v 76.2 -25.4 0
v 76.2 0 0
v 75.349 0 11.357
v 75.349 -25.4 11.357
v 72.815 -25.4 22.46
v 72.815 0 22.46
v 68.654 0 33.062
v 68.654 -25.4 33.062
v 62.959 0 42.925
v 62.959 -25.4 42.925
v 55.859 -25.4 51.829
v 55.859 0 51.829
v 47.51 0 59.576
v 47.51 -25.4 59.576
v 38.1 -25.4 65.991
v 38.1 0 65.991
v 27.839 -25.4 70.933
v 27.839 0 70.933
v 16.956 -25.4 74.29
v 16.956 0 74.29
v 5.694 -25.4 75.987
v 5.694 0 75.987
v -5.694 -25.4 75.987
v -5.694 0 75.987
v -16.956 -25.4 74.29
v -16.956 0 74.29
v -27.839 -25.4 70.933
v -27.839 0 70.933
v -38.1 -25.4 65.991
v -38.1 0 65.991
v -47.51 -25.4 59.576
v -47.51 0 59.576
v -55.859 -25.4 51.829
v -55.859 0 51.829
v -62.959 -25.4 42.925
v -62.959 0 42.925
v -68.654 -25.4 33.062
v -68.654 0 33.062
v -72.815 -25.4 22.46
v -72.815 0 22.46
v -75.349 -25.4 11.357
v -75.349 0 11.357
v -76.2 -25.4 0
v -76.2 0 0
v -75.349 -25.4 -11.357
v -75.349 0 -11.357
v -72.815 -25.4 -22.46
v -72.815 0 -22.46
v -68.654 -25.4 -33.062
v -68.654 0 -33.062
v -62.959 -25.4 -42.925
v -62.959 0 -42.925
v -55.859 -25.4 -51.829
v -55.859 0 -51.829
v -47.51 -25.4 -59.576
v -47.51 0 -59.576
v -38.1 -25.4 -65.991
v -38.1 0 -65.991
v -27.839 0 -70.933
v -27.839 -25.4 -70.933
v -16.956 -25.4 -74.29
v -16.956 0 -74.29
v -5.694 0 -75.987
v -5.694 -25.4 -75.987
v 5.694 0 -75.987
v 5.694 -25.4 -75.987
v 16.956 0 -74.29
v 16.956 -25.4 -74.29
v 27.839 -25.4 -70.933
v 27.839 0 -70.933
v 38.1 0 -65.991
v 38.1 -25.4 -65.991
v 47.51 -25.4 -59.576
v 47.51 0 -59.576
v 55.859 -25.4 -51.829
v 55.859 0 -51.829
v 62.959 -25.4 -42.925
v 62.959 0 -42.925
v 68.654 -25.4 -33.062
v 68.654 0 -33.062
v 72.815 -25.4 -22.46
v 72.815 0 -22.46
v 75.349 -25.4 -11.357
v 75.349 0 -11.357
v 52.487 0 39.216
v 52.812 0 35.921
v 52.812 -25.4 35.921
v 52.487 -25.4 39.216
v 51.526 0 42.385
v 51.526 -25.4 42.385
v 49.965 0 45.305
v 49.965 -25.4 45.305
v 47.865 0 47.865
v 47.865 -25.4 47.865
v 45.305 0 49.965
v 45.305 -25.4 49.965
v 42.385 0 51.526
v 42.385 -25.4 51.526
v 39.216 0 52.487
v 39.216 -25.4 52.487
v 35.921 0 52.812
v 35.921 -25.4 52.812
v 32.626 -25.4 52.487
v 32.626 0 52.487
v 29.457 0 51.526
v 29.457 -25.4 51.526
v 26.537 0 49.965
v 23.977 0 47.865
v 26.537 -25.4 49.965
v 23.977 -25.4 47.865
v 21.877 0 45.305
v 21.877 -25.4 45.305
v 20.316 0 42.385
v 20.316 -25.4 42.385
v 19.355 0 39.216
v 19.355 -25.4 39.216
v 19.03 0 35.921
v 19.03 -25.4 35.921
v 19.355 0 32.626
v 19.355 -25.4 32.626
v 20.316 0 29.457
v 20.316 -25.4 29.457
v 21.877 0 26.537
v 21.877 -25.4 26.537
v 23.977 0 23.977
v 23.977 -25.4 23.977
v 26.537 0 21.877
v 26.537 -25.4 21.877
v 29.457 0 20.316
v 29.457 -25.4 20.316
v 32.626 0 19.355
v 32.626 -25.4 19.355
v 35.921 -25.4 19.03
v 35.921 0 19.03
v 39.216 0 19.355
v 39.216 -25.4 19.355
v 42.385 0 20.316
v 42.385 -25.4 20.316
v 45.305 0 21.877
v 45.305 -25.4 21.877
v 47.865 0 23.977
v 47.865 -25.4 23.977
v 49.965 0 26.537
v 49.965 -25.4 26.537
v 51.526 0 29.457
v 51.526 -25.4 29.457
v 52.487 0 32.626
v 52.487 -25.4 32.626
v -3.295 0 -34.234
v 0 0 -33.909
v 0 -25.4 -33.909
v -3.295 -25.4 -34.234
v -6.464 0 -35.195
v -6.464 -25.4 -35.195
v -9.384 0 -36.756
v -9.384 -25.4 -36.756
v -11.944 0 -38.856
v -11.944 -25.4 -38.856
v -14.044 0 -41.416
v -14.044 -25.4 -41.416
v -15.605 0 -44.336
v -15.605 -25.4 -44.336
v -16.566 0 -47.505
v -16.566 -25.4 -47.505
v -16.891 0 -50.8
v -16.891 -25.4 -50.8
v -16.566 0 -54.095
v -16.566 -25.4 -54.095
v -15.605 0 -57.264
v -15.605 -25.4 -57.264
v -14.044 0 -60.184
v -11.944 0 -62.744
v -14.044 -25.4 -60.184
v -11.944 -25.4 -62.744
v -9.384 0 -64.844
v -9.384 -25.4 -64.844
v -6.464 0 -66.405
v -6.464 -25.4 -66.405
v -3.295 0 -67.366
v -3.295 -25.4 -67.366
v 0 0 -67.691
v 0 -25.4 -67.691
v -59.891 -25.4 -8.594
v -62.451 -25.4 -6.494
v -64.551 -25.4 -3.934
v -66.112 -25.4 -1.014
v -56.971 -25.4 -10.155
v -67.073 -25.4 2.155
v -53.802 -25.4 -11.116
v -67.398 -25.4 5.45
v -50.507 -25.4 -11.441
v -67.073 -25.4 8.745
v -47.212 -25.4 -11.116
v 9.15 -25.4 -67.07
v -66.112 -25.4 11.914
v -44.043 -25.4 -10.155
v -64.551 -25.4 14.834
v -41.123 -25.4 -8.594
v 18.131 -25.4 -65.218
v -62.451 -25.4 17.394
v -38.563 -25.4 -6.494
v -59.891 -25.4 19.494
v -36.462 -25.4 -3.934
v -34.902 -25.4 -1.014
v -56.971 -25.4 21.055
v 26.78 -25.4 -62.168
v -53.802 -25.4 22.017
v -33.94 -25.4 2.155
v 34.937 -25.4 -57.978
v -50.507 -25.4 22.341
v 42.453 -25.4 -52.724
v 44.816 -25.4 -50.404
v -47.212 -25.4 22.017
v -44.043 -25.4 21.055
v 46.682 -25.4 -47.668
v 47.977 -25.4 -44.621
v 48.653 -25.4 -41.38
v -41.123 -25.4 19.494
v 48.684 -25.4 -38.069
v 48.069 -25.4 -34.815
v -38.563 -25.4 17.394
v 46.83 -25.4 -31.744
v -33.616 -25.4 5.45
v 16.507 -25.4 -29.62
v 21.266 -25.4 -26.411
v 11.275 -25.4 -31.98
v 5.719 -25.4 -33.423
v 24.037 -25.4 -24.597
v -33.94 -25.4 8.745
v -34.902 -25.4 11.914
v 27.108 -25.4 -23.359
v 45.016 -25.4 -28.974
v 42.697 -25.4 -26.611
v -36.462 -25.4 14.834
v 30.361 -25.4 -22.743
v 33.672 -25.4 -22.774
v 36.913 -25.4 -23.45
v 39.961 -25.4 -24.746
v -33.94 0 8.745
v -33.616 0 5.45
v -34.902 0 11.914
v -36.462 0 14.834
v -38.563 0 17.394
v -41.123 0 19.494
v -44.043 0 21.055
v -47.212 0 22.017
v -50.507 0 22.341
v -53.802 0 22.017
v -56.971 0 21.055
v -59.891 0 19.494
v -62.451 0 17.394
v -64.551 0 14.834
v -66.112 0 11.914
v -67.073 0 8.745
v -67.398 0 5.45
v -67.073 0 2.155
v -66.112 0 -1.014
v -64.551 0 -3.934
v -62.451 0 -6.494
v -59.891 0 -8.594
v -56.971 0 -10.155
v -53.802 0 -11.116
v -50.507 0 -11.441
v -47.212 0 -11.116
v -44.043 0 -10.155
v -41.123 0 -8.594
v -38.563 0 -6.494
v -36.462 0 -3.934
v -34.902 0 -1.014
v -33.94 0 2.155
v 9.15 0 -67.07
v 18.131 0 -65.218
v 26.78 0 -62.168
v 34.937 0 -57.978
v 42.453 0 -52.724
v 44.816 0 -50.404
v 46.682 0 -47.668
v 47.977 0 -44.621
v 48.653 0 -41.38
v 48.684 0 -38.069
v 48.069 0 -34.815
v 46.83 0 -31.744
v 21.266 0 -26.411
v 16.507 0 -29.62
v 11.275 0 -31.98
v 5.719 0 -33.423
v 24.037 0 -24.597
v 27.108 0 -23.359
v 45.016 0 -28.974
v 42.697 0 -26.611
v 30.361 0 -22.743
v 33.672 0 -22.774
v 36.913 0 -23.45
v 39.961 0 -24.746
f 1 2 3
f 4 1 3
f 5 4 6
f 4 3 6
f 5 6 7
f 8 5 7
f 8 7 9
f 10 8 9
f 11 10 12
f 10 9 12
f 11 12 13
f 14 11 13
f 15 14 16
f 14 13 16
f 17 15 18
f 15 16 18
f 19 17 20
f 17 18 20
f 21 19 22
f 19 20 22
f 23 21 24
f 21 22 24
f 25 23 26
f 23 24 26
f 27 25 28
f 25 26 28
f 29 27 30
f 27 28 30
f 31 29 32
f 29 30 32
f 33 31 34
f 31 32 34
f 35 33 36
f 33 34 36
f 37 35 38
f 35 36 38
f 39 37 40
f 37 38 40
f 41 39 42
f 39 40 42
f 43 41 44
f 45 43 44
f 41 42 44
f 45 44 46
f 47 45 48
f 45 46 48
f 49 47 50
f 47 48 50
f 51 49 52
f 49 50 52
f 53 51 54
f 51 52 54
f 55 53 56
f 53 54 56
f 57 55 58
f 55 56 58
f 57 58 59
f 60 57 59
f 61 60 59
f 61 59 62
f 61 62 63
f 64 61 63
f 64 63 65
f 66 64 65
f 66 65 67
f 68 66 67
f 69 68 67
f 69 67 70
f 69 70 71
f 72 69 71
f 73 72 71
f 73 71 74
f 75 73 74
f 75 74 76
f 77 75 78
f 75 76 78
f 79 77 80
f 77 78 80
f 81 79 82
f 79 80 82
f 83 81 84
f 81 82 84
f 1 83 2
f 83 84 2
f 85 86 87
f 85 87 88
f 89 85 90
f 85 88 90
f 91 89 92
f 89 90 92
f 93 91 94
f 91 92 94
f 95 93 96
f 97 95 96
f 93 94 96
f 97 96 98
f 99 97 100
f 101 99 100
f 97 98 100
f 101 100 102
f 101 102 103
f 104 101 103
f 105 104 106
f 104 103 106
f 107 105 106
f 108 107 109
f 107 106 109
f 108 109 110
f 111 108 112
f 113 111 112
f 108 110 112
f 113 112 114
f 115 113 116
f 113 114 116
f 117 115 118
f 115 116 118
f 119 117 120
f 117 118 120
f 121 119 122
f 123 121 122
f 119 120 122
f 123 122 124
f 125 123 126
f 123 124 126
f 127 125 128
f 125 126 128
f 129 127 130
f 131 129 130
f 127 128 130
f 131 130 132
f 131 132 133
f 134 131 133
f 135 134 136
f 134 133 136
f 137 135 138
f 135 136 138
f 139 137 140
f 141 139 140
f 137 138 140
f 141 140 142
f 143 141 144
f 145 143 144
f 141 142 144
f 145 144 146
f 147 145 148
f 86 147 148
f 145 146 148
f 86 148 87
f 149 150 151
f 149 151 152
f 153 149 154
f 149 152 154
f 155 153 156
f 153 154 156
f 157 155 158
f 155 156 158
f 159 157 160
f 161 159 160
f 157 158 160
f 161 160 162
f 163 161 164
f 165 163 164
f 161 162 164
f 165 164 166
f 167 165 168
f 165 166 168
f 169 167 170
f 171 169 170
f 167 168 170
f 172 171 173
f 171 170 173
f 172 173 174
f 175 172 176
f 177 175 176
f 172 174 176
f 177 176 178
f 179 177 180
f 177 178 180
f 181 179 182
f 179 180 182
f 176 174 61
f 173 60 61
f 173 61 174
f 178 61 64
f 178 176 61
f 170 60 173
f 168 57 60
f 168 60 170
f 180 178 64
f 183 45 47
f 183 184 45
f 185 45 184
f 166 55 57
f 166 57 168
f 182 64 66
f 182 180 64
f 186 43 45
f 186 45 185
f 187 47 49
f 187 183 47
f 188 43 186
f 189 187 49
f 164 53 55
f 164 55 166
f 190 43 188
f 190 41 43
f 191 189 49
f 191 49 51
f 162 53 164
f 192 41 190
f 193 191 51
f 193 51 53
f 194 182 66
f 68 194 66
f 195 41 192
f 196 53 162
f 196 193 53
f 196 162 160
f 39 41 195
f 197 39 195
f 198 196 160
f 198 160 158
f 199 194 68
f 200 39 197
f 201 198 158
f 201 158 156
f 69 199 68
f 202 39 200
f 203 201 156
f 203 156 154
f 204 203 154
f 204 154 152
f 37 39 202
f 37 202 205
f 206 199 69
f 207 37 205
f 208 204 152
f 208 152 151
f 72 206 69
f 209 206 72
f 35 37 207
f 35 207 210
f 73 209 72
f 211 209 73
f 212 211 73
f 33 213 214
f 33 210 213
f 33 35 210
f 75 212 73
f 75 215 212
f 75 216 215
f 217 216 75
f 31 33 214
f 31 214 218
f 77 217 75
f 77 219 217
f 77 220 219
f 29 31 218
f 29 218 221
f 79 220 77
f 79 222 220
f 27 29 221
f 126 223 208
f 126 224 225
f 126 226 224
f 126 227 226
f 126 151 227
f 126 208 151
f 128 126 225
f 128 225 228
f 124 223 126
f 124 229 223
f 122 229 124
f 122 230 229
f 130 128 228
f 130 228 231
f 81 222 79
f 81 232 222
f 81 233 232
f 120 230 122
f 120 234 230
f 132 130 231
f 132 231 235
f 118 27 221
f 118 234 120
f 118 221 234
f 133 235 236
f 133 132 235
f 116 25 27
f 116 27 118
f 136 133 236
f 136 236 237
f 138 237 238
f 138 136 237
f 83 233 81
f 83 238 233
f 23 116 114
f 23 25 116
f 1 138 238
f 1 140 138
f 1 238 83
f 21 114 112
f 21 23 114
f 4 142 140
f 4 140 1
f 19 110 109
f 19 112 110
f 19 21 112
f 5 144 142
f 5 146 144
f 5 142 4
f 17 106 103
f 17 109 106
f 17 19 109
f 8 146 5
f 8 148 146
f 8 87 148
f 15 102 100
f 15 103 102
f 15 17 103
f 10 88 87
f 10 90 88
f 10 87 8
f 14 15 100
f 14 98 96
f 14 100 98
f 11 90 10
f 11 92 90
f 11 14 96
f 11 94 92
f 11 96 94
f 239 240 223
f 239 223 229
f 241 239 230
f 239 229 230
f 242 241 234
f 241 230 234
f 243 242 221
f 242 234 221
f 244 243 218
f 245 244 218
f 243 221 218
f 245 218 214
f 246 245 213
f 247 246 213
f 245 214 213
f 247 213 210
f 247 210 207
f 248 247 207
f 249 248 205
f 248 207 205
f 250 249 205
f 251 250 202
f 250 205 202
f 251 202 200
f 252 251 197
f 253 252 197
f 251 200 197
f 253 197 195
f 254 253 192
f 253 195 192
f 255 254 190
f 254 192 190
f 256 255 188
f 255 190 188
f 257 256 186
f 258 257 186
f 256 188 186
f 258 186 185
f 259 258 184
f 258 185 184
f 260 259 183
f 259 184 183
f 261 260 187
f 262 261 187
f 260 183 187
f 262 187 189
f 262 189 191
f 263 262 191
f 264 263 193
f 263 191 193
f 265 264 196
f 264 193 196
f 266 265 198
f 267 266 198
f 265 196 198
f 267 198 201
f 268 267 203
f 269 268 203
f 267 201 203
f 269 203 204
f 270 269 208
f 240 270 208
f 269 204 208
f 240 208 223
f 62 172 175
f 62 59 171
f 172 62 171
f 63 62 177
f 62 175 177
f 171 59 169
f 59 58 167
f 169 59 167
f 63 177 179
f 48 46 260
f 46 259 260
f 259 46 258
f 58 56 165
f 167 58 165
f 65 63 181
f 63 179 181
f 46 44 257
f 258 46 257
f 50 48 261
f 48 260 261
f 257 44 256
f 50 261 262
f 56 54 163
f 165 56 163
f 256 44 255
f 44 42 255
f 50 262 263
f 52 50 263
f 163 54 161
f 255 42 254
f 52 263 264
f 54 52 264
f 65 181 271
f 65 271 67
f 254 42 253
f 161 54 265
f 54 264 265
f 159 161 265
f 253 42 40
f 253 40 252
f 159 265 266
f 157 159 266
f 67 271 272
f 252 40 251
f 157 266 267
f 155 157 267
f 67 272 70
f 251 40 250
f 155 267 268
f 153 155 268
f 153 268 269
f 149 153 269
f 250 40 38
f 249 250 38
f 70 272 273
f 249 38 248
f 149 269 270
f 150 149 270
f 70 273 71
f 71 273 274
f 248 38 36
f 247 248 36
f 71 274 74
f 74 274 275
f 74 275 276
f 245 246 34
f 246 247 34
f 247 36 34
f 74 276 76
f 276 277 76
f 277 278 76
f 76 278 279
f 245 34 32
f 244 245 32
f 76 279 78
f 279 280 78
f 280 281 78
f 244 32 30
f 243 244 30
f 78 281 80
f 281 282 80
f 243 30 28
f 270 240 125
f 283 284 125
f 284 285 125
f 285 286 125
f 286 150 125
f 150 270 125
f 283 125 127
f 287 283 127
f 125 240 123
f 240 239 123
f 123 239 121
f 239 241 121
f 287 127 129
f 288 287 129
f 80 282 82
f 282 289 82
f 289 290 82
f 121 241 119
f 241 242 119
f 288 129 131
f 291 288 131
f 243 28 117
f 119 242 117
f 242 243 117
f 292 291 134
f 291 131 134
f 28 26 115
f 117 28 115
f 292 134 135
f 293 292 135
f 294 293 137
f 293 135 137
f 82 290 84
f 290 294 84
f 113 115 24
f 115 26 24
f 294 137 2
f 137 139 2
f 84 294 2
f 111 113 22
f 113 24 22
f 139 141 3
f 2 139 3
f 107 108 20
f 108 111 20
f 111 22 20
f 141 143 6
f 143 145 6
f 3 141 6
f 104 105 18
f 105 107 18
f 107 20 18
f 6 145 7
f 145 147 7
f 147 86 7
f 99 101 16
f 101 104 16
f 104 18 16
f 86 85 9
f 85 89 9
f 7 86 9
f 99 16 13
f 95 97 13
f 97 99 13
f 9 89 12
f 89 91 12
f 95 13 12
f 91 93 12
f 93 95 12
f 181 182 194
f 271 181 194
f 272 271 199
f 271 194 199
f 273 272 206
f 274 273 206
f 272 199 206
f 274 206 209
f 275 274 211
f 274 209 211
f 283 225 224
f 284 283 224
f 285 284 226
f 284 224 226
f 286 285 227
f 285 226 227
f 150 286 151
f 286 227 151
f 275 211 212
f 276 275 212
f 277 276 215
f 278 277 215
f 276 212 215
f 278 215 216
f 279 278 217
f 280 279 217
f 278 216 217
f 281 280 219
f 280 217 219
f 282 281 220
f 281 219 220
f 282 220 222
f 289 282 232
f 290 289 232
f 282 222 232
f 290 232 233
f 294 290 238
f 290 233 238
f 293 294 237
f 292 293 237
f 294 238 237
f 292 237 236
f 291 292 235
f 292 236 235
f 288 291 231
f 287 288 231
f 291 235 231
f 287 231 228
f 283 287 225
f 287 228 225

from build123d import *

# Parameters (mm, degrees)
F0_R     = 76.2
F1_DEPTH = 25.4
F3_R     = 16.891
F4_DEPTH = 25.4


with BuildPart() as f1:
    # F0 (on Front) → F1 (new body)
    with BuildSketch(Plane.XZ):
        Circle(F0_R)
    extrude(amount=F1_DEPTH)

    # F3 (on face) → F4 (cut)
    with BuildSketch(Plane.XZ.offset(25.4)):
        with Locations((35.921024, 35.921024)):
            Circle(F3_R)
        with BuildLine():
            ThreePointArc((21.266493, -26.411296), (11.274742, -31.979688), (0, -33.909))
            ThreePointArc((0, -33.909), (-16.891, -50.8), (0, -67.691))
            ThreePointArc((0, -67.691), (22.507258, -63.839602), (42.453336, -52.723674))
            ThreePointArc((42.453336, -52.723674), (45.016103, -28.974064), (21.266493, -26.411296))
        make_face()
        with Locations((-50.506798, 5.450076)):
            Circle(F3_R)
    extrude(amount=-F4_DEPTH, mode=Mode.SUBTRACT)


solid = f1.part
